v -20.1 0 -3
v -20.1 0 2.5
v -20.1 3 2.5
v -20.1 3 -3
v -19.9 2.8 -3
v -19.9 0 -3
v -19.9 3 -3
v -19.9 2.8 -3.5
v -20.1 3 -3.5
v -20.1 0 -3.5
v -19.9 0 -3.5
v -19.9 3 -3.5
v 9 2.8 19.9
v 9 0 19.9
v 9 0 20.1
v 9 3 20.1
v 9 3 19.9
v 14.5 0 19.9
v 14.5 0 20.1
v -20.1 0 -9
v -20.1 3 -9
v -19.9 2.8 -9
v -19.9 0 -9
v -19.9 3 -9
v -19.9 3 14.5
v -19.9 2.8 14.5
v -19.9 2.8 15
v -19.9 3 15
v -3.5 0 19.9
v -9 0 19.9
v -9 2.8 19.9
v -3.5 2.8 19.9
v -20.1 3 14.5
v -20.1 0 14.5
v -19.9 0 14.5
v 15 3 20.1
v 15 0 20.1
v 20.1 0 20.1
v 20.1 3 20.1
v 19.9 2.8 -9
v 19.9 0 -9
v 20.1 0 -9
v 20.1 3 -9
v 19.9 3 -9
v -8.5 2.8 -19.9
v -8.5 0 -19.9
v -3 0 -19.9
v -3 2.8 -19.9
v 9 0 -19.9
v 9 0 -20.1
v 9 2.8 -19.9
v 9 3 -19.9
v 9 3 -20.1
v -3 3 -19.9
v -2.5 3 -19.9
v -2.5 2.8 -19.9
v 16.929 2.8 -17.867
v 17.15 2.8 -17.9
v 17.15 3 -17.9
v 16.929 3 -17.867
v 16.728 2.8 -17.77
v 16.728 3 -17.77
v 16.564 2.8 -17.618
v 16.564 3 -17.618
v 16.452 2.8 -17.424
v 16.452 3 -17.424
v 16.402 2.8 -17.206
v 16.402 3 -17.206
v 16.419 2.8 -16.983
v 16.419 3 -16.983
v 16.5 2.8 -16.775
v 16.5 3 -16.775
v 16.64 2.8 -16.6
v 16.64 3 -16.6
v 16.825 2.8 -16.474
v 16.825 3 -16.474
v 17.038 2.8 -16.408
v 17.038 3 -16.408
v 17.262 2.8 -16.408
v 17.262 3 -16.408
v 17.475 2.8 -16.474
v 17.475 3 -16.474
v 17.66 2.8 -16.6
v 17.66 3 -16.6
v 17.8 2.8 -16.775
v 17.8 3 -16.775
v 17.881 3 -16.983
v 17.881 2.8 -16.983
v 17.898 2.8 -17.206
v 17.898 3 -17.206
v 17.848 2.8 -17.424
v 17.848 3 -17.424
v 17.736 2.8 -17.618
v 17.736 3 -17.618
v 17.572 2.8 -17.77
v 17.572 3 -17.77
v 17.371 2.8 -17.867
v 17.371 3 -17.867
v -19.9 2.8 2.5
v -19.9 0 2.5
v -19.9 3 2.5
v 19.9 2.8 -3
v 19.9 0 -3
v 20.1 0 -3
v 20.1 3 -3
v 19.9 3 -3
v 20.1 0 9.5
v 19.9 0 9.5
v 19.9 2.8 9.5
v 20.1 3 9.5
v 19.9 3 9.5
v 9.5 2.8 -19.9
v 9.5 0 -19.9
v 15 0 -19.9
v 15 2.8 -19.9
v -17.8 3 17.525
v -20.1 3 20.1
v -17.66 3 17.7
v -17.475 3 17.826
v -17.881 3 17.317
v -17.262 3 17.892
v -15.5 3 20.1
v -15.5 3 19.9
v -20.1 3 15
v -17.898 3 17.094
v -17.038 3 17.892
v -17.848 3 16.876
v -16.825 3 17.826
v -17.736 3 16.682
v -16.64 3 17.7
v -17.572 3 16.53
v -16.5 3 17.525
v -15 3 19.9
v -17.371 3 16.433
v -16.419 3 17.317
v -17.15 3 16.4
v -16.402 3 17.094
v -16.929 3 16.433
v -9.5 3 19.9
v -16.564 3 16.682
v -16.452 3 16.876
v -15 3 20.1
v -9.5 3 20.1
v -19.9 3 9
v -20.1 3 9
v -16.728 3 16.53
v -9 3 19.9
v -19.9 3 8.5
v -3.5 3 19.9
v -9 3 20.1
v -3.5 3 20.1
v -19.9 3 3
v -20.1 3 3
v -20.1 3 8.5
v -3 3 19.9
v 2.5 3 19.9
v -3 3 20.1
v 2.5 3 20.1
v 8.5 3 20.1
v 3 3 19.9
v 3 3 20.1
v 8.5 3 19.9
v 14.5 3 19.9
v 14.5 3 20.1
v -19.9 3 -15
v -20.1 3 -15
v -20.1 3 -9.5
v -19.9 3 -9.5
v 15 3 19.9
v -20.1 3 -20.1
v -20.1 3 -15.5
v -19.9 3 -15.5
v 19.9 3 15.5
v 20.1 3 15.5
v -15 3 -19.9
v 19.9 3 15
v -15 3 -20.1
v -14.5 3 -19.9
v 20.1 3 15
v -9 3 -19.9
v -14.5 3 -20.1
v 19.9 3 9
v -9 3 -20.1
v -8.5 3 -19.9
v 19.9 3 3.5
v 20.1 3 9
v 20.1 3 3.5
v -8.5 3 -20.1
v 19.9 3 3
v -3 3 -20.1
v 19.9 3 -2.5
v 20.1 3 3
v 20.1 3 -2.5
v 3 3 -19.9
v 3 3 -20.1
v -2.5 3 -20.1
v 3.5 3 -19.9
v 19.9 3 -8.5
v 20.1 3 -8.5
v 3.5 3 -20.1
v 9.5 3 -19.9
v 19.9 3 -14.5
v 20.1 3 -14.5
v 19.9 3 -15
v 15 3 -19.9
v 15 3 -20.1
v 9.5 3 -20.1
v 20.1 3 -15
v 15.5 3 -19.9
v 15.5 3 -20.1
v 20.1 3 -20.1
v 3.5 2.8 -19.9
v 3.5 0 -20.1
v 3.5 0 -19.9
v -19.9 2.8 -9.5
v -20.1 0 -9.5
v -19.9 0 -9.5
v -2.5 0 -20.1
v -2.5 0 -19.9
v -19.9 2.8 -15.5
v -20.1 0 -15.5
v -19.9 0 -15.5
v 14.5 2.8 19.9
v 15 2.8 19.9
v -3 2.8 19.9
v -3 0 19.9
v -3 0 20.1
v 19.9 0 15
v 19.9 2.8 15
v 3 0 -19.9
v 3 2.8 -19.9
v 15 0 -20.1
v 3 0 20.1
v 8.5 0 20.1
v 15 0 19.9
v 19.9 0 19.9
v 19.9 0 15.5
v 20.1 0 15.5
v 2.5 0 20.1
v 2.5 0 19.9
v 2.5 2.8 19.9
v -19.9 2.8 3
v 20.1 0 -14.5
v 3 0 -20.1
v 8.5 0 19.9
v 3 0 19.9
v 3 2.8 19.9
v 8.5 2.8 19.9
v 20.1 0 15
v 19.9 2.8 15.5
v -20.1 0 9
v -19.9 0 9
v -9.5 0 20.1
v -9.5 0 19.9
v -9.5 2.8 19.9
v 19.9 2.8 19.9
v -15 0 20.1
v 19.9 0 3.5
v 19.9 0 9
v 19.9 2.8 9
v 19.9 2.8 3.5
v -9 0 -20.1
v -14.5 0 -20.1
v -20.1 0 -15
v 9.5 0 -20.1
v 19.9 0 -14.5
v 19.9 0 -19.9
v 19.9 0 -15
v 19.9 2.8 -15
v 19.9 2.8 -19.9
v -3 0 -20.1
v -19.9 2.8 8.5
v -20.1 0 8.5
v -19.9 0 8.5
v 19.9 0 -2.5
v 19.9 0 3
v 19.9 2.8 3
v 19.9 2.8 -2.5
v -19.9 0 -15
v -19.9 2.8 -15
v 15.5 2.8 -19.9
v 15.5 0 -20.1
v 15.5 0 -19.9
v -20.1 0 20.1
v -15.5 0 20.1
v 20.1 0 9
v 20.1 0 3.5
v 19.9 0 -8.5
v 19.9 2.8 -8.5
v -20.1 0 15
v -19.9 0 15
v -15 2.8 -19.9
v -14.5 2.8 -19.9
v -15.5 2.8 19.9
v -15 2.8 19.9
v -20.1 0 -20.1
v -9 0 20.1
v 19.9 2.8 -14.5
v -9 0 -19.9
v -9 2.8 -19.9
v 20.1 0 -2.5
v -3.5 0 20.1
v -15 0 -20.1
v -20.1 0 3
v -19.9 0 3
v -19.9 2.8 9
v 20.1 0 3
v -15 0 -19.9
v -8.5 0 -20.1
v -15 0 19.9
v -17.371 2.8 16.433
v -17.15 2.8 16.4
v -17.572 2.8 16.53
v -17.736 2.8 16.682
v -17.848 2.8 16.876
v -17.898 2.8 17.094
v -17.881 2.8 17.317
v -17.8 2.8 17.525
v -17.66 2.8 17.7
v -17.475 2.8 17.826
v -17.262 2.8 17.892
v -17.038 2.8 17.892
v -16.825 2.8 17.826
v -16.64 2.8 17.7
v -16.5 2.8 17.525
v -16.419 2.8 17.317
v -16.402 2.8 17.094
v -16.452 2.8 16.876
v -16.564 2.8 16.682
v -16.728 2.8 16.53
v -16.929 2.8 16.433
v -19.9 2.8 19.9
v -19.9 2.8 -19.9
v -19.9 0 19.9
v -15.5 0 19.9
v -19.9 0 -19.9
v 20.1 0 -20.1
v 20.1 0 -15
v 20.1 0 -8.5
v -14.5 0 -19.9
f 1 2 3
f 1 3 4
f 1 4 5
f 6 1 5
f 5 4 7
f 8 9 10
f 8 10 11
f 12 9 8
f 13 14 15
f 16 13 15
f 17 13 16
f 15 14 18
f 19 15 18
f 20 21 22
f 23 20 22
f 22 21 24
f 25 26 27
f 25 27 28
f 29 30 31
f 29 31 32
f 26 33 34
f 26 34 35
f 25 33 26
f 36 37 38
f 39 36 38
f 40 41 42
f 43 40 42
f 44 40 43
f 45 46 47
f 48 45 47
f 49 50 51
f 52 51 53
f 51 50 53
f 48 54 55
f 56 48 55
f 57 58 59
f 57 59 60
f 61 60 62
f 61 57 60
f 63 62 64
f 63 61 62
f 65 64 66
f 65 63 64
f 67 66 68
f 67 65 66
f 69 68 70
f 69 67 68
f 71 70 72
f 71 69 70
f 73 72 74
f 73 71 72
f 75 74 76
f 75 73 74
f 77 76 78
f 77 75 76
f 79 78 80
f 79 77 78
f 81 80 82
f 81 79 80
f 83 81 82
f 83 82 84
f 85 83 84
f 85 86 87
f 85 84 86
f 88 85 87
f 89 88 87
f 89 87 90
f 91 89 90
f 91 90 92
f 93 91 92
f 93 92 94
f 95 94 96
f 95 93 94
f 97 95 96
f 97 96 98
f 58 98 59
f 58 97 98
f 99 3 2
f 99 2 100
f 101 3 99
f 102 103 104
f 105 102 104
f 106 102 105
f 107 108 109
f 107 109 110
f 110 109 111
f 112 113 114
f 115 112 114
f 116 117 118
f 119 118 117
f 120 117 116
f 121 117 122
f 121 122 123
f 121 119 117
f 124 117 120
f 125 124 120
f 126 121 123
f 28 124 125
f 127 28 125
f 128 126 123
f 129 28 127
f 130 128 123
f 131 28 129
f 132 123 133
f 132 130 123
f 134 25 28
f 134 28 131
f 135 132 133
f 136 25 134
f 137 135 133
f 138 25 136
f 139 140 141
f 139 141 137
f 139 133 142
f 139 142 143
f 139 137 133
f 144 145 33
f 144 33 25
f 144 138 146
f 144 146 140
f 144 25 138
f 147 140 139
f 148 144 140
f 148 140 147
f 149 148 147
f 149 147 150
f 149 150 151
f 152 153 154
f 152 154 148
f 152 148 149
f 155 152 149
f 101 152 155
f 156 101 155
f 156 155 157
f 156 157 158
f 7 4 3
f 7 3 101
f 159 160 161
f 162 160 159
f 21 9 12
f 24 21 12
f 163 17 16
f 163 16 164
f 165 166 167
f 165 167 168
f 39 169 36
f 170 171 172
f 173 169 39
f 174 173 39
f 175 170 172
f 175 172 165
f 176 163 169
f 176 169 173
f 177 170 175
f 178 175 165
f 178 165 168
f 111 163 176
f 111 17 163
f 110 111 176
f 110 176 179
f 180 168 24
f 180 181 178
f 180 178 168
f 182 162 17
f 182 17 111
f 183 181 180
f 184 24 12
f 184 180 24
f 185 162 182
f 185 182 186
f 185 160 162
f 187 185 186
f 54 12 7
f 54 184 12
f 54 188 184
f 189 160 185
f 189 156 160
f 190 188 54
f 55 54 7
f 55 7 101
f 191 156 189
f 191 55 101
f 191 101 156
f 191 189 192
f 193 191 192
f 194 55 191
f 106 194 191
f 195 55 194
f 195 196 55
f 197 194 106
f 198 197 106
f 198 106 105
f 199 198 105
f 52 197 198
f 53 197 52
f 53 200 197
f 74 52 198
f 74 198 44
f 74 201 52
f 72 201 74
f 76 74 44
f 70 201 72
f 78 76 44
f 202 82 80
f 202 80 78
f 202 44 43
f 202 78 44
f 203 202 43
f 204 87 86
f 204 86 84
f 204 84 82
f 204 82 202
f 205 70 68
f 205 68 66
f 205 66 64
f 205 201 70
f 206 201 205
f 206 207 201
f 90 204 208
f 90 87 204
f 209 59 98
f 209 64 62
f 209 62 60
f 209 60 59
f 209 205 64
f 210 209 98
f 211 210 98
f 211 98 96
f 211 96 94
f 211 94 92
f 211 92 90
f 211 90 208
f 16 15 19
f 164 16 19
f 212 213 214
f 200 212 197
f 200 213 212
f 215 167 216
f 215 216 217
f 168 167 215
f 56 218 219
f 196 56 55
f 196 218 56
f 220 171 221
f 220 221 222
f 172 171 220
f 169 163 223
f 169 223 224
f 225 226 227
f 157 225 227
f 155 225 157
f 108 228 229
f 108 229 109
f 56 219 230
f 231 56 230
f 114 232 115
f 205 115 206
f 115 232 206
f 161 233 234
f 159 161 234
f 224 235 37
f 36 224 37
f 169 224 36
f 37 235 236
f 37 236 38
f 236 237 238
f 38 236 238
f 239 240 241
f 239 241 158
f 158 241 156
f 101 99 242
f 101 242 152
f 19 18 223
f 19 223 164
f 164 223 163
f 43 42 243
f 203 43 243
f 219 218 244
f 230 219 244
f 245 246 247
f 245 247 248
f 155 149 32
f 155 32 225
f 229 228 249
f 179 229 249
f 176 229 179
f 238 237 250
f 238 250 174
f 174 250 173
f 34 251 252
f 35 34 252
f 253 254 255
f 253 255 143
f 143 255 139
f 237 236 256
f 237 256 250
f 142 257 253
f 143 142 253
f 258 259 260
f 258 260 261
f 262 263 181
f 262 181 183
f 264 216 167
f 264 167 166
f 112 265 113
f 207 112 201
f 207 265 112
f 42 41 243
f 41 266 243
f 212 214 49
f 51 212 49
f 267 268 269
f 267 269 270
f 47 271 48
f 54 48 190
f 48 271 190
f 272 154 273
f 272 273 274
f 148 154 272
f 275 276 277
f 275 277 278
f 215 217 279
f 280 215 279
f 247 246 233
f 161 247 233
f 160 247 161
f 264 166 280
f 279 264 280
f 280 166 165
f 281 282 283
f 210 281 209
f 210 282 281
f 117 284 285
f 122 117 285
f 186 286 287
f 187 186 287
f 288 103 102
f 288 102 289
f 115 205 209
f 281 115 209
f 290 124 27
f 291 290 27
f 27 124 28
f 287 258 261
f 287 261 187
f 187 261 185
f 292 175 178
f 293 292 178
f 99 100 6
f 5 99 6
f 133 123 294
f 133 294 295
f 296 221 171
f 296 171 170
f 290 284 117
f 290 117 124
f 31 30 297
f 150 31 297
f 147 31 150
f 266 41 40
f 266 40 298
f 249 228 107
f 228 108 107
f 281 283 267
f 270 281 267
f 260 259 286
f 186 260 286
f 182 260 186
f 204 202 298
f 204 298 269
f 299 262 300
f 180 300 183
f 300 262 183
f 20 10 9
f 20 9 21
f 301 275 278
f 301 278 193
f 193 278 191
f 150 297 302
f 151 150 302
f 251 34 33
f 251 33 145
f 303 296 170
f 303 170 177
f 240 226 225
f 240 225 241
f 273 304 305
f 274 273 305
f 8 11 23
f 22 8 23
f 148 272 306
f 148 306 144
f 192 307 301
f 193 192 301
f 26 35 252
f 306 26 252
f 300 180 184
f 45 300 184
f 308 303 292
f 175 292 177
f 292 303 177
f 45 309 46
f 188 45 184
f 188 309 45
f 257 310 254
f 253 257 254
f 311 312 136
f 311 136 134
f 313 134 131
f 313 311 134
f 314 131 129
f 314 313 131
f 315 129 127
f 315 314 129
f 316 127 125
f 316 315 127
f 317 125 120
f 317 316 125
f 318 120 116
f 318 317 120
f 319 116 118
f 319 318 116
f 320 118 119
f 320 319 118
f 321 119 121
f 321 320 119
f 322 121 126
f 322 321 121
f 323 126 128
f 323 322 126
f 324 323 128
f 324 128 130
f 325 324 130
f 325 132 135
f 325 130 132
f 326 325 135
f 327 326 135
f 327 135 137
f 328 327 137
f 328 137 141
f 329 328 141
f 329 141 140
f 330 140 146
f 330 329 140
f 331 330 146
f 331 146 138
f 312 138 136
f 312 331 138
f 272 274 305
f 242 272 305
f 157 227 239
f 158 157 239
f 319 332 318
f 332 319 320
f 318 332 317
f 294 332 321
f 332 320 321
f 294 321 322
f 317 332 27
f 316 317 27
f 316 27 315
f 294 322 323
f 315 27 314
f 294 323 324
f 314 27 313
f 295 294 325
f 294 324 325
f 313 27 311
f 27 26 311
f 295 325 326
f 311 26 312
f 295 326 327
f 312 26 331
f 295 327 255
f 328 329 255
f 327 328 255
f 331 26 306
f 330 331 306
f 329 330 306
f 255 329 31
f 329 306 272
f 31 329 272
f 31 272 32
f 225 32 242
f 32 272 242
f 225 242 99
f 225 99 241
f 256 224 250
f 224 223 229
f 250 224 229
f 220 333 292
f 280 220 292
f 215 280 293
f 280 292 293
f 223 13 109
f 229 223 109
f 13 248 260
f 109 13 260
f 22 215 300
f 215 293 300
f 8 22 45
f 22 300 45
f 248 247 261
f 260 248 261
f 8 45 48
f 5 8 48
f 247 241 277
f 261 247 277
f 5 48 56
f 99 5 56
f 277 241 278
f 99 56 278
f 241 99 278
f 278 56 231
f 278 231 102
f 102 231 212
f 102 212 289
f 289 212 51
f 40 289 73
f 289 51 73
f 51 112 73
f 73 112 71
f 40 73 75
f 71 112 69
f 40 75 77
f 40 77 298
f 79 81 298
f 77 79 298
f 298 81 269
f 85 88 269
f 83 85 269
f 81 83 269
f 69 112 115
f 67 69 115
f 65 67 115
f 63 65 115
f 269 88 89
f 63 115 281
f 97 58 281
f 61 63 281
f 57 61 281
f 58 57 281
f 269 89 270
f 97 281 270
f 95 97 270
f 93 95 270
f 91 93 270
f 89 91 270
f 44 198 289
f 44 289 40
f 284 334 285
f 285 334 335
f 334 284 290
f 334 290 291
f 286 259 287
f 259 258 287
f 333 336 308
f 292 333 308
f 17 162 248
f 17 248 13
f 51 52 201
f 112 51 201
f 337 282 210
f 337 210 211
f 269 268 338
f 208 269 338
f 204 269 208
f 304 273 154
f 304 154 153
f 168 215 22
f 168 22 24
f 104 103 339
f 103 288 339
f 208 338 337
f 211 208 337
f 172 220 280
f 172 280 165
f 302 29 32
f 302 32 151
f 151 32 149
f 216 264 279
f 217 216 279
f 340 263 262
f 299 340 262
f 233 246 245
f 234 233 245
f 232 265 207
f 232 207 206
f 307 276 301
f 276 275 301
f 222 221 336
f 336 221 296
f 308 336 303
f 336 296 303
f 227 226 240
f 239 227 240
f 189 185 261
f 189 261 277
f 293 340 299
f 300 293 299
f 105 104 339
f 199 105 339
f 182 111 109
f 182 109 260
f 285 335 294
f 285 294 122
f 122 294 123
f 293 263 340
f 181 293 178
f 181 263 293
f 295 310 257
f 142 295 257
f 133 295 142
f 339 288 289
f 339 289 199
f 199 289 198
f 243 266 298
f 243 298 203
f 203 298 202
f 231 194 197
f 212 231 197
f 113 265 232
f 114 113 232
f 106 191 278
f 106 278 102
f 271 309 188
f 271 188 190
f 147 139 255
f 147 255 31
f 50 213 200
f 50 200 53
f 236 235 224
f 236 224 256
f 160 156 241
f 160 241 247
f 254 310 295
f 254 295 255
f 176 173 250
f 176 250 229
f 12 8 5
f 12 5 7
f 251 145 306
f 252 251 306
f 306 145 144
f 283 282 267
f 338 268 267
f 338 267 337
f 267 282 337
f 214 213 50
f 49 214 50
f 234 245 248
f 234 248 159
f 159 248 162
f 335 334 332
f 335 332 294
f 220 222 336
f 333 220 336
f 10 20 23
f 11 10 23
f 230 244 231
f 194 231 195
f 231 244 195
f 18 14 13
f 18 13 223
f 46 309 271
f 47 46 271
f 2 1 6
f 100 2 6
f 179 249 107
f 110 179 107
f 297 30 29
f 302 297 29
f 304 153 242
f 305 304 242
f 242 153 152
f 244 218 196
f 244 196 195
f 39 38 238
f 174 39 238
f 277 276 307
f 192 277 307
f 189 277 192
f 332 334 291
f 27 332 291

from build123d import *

# Parameters (mm, degrees)
SKETCH1_W               = 40.2
SKETCH1_H               = 40.2
BOSS_EXTRUDE1_DEPTH     = 3
SHELL1_T                = -0.2
SKETCH2_R               = 0.75
HOLES_DEPTH             = 29.583561709
FINGER_START            = 19.9
SKETCH3_W               = 0.5
SKETCH3_H               = 3
FINGER_SLOT_DEPTH       = 0.2
LPATTERN3_COUNT         = 6
LPATTERN3_PITCH         = 6
CIRPATTERN1_START       = -20.1
CIRPATTERN1_OUTLINE_W   = 0.5
CIRPATTERN1_OUTLINE_H   = 3
CIRPATTERN1_DEPTH       = 0.2
CIRPATTERN1_START_2     = 19.9
CIRPATTERN1_2_OUTLINE_W = 0.5
CIRPATTERN1_2_OUTLINE_H = 3
CIRPATTERN1_2_DEPTH     = 0.2
CIRPATTERN1_START_3     = -15.5
CIRPATTERN1_3_OUTLINE_W = 0.2
CIRPATTERN1_3_OUTLINE_H = 3
CIRPATTERN1_3_DEPTH     = 0.5
CIRPATTERN1_START_4     = -9.5
CIRPATTERN1_4_OUTLINE_W = 0.2
CIRPATTERN1_4_OUTLINE_H = 3
CIRPATTERN1_4_DEPTH     = 0.5
CIRPATTERN1_START_5     = -3.5
CIRPATTERN1_5_OUTLINE_W = 0.2
CIRPATTERN1_5_OUTLINE_H = 3
CIRPATTERN1_5_DEPTH     = 0.5
CIRPATTERN1_START_6     = 2.5
CIRPATTERN1_6_OUTLINE_W = 0.2
CIRPATTERN1_6_OUTLINE_H = 3
CIRPATTERN1_6_DEPTH     = 0.5
CIRPATTERN1_START_7     = 8.5
CIRPATTERN1_7_OUTLINE_W = 0.2
CIRPATTERN1_7_OUTLINE_H = 3
CIRPATTERN1_7_DEPTH     = 0.5
CIRPATTERN1_START_8     = 14.5
CIRPATTERN1_8_OUTLINE_W = 0.2
CIRPATTERN1_8_OUTLINE_H = 3
CIRPATTERN1_8_DEPTH     = 0.5


# Read off the part's stored shape, not the designer's step: CirPattern1
with BuildPart() as part:
    # Sketch1 → Boss-Extrude1 (new body)
    with BuildSketch(Plane(origin=(0, 0, 0), x_dir=(1, 0, 0), z_dir=(0, 1, 0))):
        Rectangle(SKETCH1_W, SKETCH1_H)
    extrude(amount=BOSS_EXTRUDE1_DEPTH)

    # Shell1
    shell1_openings = [part.faces().sort_by_distance(p)[0] for p in [
        (0, 0, 0),
    ]]
    offset(amount=SHELL1_T, openings=shell1_openings, kind=Kind.INTERSECTION)

    # Sketch2 → Holes (cut, through all)
    with BuildSketch(Plane(origin=(0, 0, 0), x_dir=(1, 0, 0), z_dir=(0, 1, 0))):
        with Locations(Location((-17.15, -17.15, 0), (0, 0, 90))):
            Circle(SKETCH2_R)
        with Locations(Location((17.15, 17.15, 0), (0, 0, 90))):
            Circle(SKETCH2_R)
    extrude(amount=HOLES_DEPTH, mode=Mode.SUBTRACT)

    # Sketch3 → Finger Slot (cut)
    with BuildSketch(Plane(origin=(0, 0, 0), x_dir=(0, 0, -1), z_dir=(1, 0, 0)).offset(FINGER_START)):
        with Locations((14.75, 1.5)):
            Rectangle(SKETCH3_W, SKETCH3_H)
    finger_slot = extrude(amount=FINGER_SLOT_DEPTH, mode=Mode.SUBTRACT)

    # LPattern3: Finger Slot ×6
    with Locations(*[(0, 0, i * LPATTERN3_PITCH) for i in range(1, LPATTERN3_COUNT)]):
        add(finger_slot, mode=Mode.SUBTRACT)

    # CirPattern1 outline → CirPattern1 (cut)
    with BuildSketch(Plane.XY.offset(CIRPATTERN1_START)):
        with Locations((9.25, 1.5)):
            Rectangle(CIRPATTERN1_OUTLINE_W, CIRPATTERN1_OUTLINE_H)
        with Locations((15.25, 1.5)):
            Rectangle(CIRPATTERN1_OUTLINE_W, CIRPATTERN1_OUTLINE_H)
        with Locations((3.25, 1.5)):
            Rectangle(CIRPATTERN1_OUTLINE_W, CIRPATTERN1_OUTLINE_H)
        with Locations((-2.75, 1.5)):
            Rectangle(CIRPATTERN1_OUTLINE_W, CIRPATTERN1_OUTLINE_H)
        with Locations((-8.75, 1.5)):
            Rectangle(CIRPATTERN1_OUTLINE_W, CIRPATTERN1_OUTLINE_H)
        with Locations((-14.75, 1.5)):
            Rectangle(CIRPATTERN1_OUTLINE_W, CIRPATTERN1_OUTLINE_H)
    extrude(amount=CIRPATTERN1_DEPTH, mode=Mode.SUBTRACT)

    # CirPattern1 2 outline → CirPattern1 2 (cut)
    with BuildSketch(Plane.XY.offset(CIRPATTERN1_START_2)):
        with Locations((14.75, 1.5)):
            Rectangle(CIRPATTERN1_2_OUTLINE_W, CIRPATTERN1_2_OUTLINE_H)
        with Locations((8.75, 1.5)):
            Rectangle(CIRPATTERN1_2_OUTLINE_W, CIRPATTERN1_2_OUTLINE_H)
        with Locations((2.75, 1.5)):
            Rectangle(CIRPATTERN1_2_OUTLINE_W, CIRPATTERN1_2_OUTLINE_H)
        with Locations((-3.25, 1.5)):
            Rectangle(CIRPATTERN1_2_OUTLINE_W, CIRPATTERN1_2_OUTLINE_H)
        with Locations((-9.25, 1.5)):
            Rectangle(CIRPATTERN1_2_OUTLINE_W, CIRPATTERN1_2_OUTLINE_H)
        with Locations((-15.25, 1.5)):
            Rectangle(CIRPATTERN1_2_OUTLINE_W, CIRPATTERN1_2_OUTLINE_H)
    extrude(amount=CIRPATTERN1_2_DEPTH, mode=Mode.SUBTRACT)

    # CirPattern1 3 outline → CirPattern1 3 (cut)
    with BuildSketch(Plane.XY.offset(CIRPATTERN1_START_3)):
        with Locations((-20, 1.5)):
            Rectangle(CIRPATTERN1_3_OUTLINE_W, CIRPATTERN1_3_OUTLINE_H)
    extrude(amount=CIRPATTERN1_3_DEPTH, mode=Mode.SUBTRACT)

    # CirPattern1 4 outline → CirPattern1 4 (cut)
    with BuildSketch(Plane.XY.offset(CIRPATTERN1_START_4)):
        with Locations((-20, 1.5)):
            Rectangle(CIRPATTERN1_4_OUTLINE_W, CIRPATTERN1_4_OUTLINE_H)
    extrude(amount=CIRPATTERN1_4_DEPTH, mode=Mode.SUBTRACT)

    # CirPattern1 5 outline → CirPattern1 5 (cut)
    with BuildSketch(Plane.XY.offset(CIRPATTERN1_START_5)):
        with Locations((-20, 1.5)):
            Rectangle(CIRPATTERN1_5_OUTLINE_W, CIRPATTERN1_5_OUTLINE_H)
    extrude(amount=CIRPATTERN1_5_DEPTH, mode=Mode.SUBTRACT)

    # CirPattern1 6 outline → CirPattern1 6 (cut)
    with BuildSketch(Plane.XY.offset(CIRPATTERN1_START_6)):
        with Locations((-20, 1.5)):
            Rectangle(CIRPATTERN1_6_OUTLINE_W, CIRPATTERN1_6_OUTLINE_H)
    extrude(amount=CIRPATTERN1_6_DEPTH, mode=Mode.SUBTRACT)

    # CirPattern1 7 outline → CirPattern1 7 (cut)
    with BuildSketch(Plane.XY.offset(CIRPATTERN1_START_7)):
        with Locations((-20, 1.5)):
            Rectangle(CIRPATTERN1_7_OUTLINE_W, CIRPATTERN1_7_OUTLINE_H)
    extrude(amount=CIRPATTERN1_7_DEPTH, mode=Mode.SUBTRACT)

    # CirPattern1 8 outline → CirPattern1 8 (cut)
    with BuildSketch(Plane.XY.offset(CIRPATTERN1_START_8)):
        with Locations((-20, 1.5)):
            Rectangle(CIRPATTERN1_8_OUTLINE_W, CIRPATTERN1_8_OUTLINE_H)
    extrude(amount=CIRPATTERN1_8_DEPTH, mode=Mode.SUBTRACT)


solid = part.part
